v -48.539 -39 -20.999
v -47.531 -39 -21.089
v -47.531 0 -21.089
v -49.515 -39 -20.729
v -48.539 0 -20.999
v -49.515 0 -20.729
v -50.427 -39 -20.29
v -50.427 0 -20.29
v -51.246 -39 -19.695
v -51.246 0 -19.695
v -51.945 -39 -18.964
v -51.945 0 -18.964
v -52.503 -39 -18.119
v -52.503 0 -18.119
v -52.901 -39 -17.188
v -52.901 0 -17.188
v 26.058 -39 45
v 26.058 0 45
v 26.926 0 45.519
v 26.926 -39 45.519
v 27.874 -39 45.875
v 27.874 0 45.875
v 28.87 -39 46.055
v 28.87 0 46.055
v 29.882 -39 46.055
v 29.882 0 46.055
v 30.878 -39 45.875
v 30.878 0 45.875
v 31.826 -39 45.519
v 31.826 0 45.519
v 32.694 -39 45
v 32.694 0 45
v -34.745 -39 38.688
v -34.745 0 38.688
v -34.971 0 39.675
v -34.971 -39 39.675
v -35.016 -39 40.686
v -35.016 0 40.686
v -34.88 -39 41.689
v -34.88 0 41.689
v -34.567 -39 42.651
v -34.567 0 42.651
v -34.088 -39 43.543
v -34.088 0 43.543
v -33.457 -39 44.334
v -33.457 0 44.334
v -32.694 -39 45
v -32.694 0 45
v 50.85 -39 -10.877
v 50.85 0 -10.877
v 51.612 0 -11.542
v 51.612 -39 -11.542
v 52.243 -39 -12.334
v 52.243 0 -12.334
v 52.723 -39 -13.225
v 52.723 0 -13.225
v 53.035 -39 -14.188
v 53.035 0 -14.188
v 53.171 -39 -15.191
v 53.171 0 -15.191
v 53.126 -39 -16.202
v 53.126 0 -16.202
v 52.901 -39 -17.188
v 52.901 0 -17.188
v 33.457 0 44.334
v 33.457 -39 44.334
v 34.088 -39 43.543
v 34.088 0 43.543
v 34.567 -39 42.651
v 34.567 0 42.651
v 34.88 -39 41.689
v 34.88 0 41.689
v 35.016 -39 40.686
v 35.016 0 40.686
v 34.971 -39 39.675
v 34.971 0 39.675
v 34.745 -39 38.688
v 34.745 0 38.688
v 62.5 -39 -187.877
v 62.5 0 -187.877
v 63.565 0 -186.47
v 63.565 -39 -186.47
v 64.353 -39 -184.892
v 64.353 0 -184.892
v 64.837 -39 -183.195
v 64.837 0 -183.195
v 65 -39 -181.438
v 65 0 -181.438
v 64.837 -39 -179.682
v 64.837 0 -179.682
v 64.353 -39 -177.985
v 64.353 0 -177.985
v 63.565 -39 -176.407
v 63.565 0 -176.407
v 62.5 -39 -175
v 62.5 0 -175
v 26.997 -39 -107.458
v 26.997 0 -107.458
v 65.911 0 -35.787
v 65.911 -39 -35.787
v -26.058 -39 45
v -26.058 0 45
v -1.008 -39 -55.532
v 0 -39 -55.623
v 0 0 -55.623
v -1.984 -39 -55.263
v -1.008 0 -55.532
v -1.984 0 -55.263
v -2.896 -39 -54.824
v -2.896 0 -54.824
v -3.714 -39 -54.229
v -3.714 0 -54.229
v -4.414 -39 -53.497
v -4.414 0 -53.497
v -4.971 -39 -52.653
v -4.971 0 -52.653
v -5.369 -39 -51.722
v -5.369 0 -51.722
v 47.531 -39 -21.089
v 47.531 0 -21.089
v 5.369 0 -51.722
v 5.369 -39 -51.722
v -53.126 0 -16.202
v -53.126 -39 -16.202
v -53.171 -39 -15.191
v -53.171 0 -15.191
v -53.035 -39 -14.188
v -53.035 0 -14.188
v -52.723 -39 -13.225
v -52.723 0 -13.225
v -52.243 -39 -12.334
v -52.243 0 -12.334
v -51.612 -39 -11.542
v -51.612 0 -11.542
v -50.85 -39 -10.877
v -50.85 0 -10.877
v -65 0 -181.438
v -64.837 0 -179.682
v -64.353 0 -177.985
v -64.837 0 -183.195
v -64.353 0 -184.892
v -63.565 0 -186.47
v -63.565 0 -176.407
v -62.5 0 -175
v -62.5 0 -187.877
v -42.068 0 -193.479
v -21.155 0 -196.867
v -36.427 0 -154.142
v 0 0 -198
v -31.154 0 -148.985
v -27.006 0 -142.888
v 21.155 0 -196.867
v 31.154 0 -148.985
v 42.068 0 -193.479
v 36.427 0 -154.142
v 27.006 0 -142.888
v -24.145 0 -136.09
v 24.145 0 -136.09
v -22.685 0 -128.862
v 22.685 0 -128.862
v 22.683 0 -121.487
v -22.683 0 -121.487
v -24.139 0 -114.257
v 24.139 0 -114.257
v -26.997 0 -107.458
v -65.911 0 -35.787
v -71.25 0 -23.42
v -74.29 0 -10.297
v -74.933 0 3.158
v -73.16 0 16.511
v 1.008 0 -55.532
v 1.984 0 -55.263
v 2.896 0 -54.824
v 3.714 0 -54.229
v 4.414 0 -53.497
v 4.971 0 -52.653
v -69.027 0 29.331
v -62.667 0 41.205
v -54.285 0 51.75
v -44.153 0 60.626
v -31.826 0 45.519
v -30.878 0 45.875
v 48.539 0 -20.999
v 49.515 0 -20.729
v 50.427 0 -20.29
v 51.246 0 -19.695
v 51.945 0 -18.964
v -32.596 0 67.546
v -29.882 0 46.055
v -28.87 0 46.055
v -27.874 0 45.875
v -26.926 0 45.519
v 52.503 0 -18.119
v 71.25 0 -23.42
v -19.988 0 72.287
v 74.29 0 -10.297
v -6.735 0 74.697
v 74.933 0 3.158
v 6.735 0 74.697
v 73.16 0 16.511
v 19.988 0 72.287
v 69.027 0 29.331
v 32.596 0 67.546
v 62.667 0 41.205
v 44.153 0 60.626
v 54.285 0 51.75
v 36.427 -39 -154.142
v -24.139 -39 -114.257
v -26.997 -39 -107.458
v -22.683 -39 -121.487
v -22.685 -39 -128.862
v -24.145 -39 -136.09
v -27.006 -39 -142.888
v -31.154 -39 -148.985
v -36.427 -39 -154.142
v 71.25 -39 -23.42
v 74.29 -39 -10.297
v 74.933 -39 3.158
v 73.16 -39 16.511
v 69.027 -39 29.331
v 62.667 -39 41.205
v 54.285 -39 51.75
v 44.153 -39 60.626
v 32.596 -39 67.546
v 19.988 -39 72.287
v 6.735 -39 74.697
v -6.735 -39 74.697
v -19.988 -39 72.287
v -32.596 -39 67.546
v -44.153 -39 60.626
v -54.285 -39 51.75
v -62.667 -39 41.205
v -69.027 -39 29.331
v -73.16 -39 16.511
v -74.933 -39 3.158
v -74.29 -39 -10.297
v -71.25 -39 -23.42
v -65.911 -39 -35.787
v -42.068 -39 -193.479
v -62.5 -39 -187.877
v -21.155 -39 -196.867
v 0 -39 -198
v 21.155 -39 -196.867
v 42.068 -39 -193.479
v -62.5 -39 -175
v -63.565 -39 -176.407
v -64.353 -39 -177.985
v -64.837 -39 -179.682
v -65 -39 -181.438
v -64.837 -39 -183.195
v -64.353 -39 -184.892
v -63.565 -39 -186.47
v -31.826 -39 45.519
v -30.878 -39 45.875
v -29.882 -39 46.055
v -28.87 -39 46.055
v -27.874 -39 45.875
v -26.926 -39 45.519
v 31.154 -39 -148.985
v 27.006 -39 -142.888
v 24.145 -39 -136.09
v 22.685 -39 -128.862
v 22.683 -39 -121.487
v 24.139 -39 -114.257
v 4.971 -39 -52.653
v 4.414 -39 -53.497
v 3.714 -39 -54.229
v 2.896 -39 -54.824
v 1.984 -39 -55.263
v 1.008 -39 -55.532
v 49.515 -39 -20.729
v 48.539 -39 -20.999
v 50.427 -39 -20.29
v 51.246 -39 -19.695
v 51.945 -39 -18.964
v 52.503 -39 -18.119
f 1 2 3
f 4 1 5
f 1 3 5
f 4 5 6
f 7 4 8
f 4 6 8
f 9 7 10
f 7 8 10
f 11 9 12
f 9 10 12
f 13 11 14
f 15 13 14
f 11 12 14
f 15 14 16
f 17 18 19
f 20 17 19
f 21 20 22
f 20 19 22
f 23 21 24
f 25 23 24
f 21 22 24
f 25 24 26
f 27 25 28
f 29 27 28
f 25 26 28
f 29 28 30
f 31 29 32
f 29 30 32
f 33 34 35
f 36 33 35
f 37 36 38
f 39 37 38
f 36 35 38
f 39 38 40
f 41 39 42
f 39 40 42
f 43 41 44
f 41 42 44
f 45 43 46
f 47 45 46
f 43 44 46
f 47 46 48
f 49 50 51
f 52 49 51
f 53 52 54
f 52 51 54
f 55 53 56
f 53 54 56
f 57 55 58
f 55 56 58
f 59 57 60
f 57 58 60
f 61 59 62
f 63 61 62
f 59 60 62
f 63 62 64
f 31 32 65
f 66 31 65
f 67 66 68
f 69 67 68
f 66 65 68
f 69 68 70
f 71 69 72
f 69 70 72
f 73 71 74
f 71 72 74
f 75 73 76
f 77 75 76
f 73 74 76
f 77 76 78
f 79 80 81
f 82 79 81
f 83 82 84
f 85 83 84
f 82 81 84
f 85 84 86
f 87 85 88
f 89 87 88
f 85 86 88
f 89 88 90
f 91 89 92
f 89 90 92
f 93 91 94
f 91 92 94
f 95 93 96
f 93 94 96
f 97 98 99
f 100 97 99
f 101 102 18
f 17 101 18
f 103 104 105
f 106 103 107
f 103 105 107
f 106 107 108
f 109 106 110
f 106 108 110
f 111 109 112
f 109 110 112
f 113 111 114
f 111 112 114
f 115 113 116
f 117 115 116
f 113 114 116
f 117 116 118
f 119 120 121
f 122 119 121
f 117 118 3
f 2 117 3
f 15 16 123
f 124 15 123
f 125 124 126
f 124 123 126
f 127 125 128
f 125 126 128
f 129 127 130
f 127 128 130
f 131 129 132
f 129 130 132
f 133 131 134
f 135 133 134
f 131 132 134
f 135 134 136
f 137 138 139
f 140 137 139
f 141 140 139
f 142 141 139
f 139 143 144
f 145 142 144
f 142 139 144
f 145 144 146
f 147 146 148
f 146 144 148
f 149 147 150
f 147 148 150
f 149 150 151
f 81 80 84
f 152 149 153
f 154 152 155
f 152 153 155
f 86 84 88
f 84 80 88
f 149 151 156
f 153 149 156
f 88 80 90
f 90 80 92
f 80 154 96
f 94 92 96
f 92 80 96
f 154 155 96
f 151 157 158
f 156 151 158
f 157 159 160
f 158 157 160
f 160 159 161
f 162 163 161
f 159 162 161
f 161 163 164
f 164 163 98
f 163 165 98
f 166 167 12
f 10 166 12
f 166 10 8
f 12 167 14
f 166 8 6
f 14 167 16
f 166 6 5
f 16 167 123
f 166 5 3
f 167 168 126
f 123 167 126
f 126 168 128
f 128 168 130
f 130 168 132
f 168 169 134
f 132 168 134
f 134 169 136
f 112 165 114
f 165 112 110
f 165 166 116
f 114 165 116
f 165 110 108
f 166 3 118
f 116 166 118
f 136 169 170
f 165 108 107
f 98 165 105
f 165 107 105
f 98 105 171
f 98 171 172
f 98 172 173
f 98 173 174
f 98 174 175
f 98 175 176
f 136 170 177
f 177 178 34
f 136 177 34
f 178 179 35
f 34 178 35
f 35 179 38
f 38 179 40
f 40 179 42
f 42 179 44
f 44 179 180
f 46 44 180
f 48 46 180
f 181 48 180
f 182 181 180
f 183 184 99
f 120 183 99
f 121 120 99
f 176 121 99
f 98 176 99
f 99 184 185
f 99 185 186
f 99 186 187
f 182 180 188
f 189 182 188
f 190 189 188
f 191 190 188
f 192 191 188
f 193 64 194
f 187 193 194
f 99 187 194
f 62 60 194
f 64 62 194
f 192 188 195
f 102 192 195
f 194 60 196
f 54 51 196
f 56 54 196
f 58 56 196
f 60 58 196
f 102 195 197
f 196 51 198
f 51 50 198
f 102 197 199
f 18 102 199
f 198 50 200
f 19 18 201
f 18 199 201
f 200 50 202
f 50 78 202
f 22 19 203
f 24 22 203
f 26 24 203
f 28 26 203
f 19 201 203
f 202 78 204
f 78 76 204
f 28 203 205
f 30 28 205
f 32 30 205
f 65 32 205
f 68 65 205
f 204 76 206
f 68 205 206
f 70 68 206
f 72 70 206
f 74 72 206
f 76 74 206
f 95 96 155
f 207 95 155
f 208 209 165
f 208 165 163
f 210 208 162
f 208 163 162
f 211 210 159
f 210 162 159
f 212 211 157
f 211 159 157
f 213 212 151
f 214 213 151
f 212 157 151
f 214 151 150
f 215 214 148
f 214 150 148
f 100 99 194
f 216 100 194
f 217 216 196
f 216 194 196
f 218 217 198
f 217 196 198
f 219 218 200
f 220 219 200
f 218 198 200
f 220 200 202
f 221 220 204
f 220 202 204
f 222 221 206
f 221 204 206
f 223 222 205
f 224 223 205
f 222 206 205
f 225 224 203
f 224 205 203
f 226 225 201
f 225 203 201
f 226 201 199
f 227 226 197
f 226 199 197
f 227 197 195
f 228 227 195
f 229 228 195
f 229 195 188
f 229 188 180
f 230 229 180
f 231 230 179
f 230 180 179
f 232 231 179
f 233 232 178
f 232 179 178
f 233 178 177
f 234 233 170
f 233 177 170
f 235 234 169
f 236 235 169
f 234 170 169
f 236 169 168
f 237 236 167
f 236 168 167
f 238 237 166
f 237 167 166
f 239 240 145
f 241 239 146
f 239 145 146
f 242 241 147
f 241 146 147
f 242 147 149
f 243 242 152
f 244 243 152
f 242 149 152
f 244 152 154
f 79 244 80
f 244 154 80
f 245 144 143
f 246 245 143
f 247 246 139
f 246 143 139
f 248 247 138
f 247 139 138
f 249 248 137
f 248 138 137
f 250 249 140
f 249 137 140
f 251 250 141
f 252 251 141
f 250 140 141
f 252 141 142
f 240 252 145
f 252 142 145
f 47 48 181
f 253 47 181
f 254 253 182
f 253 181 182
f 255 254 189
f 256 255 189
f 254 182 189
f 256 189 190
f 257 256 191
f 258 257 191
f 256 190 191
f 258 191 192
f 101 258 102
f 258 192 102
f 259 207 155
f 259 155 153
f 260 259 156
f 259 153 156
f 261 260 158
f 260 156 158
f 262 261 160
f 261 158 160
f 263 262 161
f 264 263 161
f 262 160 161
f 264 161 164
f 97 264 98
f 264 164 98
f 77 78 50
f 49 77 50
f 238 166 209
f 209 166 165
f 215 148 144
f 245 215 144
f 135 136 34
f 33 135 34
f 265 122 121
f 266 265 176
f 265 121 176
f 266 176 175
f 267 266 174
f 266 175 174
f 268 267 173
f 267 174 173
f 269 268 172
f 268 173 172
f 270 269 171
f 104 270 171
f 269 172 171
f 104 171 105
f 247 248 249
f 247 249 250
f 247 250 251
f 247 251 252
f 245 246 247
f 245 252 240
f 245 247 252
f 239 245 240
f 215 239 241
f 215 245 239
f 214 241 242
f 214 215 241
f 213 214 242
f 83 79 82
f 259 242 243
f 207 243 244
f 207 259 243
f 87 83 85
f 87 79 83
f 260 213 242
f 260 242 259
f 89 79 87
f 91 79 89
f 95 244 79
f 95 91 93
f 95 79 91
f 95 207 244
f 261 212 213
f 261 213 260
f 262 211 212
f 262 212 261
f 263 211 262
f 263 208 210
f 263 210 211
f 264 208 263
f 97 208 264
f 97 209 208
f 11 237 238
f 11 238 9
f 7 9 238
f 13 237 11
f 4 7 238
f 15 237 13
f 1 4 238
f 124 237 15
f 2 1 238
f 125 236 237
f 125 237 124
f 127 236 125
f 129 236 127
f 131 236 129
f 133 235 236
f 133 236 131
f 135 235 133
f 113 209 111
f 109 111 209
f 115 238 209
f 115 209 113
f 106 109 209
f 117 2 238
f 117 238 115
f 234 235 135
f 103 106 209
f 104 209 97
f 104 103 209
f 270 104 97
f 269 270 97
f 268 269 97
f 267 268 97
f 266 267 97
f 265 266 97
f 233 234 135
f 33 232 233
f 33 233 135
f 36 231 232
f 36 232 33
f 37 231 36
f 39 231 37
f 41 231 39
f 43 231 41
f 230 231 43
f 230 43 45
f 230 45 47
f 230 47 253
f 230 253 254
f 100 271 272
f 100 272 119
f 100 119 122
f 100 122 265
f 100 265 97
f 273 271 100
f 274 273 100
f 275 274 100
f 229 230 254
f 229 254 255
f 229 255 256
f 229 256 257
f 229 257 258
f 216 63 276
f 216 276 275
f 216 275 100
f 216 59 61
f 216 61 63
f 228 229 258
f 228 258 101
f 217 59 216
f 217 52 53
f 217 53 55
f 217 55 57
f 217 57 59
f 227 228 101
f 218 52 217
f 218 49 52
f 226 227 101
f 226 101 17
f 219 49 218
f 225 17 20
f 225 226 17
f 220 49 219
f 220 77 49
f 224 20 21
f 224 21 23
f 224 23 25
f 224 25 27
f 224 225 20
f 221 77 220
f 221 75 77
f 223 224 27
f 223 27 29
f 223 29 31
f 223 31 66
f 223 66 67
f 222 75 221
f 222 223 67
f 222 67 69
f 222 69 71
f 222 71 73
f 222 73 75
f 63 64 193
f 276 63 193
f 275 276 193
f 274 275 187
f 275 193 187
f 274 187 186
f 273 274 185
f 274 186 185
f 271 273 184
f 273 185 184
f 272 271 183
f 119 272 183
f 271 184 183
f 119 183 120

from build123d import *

# Parameters (mm, degrees)
F1_DEPTH = 39


with BuildPart() as f1:
    # F0 (on Front) → F1 (new body)
    with BuildSketch(Plane.XZ):
        with BuildLine():
            ThreePointArc((65.9112834496, -35.7869070195), (0, 75), (-65.9112834496, -35.7869070195))
            Line((-65.9112834496, -35.7869070195), (-26.9968870374, -107.4583093791))
            ThreePointArc((-26.9968870374, -107.4583093791), (-23.2346773471, -132.5123240584), (-36.426916686, -154.1415333488))
            Line((-36.426916686, -154.1415333488), (-62.5, -175))
            ThreePointArc((-62.5, -175), (-65, -181.4384772072), (-62.5, -187.8769544143))
            ThreePointArc((-62.5, -187.8769544143), (0, -198), (62.5, -187.8769544143))
            ThreePointArc((62.5, -187.8769544143), (65, -181.4384772072), (62.5, -175))
            Line((62.5, -175), (36.426916686, -154.1415333488))
            ThreePointArc((36.426916686, -154.1415333488), (23.2346773471, -132.5123240584), (26.9968870374, -107.4583093791))
            Line((26.9968870374, -107.4583093791), (65.9112834496, -35.7869070195))
        make_face()
        with BuildLine():
            ThreePointArc((-34.7452932117, 38.6880420754), (-34.7452932117, 42.1772066019), (-32.6944137602, 45))
            ThreePointArc((-32.6944137602, 45), (-29.3760211009, 46.0782111348), (-26.0576284416, 45))
            ThreePointArc((-26.0576284416, 45), (0, 52), (26.0576284416, 45))
            ThreePointArc((26.0576284416, 45), (29.3760211009, 46.0782111348), (32.6944137602, 45))
            ThreePointArc((32.6944137602, 45), (34.7452932117, 42.1772066019), (34.7452932117, 38.6880420754))
            ThreePointArc((34.7452932117, 38.6880420754), (47.4908162017, 21.1807076486), (52, 0))
            ThreePointArc((52, 0), (51.7116488291, -5.4685807459), (50.8497932548, -10.8765125817))
            ThreePointArc((50.8497932548, -10.8765125817), (52.9006727063, -13.6993059798), (52.9006727063, -17.1884705063))
            ThreePointArc((52.9006727063, -17.1884705063), (50.8497932548, -20.0112639043), (47.5314005955, -21.0894750392))
            ThreePointArc((47.5314005955, -21.0894750392), (30.5648331192, -42.0688837075), (5.3692721108, -51.7220544546))
            ThreePointArc((5.3692721108, -51.7220544546), (3.3183926593, -54.5448478526), (0, -55.6230589875))
            ThreePointArc((0, -55.6230589875), (-3.3183926593, -54.5448478526), (-5.3692721108, -51.7220544546))
            ThreePointArc((-5.3692721108, -51.7220544546), (-30.5648331192, -42.0688837075), (-47.5314005955, -21.0894750392))
            ThreePointArc((-47.5314005955, -21.0894750392), (-50.8497932548, -20.0112639043), (-52.9006727063, -17.1884705063))
            ThreePointArc((-52.9006727063, -17.1884705063), (-52.9006727063, -13.6993059798), (-50.8497932548, -10.8765125817))
            ThreePointArc((-50.8497932548, -10.8765125817), (-49.4549388473, 16.0688837075), (-34.7452932117, 38.6880420754))
        make_face(mode=Mode.SUBTRACT)
        with BuildLine():
            ThreePointArc((26.0576284416, 45), (0, 52), (-26.0576284416, 45))
            Line((-26.0576284416, 45), (26.0576284416, 45))
        make_face()
        with BuildLine():
            Line((-50.8497932548, -10.8765125817), (-34.7452932117, 38.6880420754))
            ThreePointArc((-34.7452932117, 38.6880420754), (-49.4549388473, 16.0688837075), (-50.8497932548, -10.8765125817))
        make_face()
        with BuildLine():
            ThreePointArc((52, 0), (47.4908162017, 21.1807076486), (34.7452932117, 38.6880420754))
            Line((34.7452932117, 38.6880420754), (50.8497932548, -10.8765125817))
            ThreePointArc((50.8497932548, -10.8765125817), (51.7116488291, -5.4685807459), (52, 0))
        make_face()
        with BuildLine():
            Line((-5.3692721108, -51.7220544546), (-47.5314005955, -21.0894750392))
            ThreePointArc((-47.5314005955, -21.0894750392), (-30.5648331192, -42.0688837075), (-5.3692721108, -51.7220544546))
        make_face()
        with BuildLine():
            ThreePointArc((5.3692721108, -51.7220544546), (30.5648331192, -42.0688837075), (47.5314005955, -21.0894750392))
            Line((47.5314005955, -21.0894750392), (5.3692721108, -51.7220544546))
        make_face()
    extrude(amount=F1_DEPTH)


solid = f1.part
